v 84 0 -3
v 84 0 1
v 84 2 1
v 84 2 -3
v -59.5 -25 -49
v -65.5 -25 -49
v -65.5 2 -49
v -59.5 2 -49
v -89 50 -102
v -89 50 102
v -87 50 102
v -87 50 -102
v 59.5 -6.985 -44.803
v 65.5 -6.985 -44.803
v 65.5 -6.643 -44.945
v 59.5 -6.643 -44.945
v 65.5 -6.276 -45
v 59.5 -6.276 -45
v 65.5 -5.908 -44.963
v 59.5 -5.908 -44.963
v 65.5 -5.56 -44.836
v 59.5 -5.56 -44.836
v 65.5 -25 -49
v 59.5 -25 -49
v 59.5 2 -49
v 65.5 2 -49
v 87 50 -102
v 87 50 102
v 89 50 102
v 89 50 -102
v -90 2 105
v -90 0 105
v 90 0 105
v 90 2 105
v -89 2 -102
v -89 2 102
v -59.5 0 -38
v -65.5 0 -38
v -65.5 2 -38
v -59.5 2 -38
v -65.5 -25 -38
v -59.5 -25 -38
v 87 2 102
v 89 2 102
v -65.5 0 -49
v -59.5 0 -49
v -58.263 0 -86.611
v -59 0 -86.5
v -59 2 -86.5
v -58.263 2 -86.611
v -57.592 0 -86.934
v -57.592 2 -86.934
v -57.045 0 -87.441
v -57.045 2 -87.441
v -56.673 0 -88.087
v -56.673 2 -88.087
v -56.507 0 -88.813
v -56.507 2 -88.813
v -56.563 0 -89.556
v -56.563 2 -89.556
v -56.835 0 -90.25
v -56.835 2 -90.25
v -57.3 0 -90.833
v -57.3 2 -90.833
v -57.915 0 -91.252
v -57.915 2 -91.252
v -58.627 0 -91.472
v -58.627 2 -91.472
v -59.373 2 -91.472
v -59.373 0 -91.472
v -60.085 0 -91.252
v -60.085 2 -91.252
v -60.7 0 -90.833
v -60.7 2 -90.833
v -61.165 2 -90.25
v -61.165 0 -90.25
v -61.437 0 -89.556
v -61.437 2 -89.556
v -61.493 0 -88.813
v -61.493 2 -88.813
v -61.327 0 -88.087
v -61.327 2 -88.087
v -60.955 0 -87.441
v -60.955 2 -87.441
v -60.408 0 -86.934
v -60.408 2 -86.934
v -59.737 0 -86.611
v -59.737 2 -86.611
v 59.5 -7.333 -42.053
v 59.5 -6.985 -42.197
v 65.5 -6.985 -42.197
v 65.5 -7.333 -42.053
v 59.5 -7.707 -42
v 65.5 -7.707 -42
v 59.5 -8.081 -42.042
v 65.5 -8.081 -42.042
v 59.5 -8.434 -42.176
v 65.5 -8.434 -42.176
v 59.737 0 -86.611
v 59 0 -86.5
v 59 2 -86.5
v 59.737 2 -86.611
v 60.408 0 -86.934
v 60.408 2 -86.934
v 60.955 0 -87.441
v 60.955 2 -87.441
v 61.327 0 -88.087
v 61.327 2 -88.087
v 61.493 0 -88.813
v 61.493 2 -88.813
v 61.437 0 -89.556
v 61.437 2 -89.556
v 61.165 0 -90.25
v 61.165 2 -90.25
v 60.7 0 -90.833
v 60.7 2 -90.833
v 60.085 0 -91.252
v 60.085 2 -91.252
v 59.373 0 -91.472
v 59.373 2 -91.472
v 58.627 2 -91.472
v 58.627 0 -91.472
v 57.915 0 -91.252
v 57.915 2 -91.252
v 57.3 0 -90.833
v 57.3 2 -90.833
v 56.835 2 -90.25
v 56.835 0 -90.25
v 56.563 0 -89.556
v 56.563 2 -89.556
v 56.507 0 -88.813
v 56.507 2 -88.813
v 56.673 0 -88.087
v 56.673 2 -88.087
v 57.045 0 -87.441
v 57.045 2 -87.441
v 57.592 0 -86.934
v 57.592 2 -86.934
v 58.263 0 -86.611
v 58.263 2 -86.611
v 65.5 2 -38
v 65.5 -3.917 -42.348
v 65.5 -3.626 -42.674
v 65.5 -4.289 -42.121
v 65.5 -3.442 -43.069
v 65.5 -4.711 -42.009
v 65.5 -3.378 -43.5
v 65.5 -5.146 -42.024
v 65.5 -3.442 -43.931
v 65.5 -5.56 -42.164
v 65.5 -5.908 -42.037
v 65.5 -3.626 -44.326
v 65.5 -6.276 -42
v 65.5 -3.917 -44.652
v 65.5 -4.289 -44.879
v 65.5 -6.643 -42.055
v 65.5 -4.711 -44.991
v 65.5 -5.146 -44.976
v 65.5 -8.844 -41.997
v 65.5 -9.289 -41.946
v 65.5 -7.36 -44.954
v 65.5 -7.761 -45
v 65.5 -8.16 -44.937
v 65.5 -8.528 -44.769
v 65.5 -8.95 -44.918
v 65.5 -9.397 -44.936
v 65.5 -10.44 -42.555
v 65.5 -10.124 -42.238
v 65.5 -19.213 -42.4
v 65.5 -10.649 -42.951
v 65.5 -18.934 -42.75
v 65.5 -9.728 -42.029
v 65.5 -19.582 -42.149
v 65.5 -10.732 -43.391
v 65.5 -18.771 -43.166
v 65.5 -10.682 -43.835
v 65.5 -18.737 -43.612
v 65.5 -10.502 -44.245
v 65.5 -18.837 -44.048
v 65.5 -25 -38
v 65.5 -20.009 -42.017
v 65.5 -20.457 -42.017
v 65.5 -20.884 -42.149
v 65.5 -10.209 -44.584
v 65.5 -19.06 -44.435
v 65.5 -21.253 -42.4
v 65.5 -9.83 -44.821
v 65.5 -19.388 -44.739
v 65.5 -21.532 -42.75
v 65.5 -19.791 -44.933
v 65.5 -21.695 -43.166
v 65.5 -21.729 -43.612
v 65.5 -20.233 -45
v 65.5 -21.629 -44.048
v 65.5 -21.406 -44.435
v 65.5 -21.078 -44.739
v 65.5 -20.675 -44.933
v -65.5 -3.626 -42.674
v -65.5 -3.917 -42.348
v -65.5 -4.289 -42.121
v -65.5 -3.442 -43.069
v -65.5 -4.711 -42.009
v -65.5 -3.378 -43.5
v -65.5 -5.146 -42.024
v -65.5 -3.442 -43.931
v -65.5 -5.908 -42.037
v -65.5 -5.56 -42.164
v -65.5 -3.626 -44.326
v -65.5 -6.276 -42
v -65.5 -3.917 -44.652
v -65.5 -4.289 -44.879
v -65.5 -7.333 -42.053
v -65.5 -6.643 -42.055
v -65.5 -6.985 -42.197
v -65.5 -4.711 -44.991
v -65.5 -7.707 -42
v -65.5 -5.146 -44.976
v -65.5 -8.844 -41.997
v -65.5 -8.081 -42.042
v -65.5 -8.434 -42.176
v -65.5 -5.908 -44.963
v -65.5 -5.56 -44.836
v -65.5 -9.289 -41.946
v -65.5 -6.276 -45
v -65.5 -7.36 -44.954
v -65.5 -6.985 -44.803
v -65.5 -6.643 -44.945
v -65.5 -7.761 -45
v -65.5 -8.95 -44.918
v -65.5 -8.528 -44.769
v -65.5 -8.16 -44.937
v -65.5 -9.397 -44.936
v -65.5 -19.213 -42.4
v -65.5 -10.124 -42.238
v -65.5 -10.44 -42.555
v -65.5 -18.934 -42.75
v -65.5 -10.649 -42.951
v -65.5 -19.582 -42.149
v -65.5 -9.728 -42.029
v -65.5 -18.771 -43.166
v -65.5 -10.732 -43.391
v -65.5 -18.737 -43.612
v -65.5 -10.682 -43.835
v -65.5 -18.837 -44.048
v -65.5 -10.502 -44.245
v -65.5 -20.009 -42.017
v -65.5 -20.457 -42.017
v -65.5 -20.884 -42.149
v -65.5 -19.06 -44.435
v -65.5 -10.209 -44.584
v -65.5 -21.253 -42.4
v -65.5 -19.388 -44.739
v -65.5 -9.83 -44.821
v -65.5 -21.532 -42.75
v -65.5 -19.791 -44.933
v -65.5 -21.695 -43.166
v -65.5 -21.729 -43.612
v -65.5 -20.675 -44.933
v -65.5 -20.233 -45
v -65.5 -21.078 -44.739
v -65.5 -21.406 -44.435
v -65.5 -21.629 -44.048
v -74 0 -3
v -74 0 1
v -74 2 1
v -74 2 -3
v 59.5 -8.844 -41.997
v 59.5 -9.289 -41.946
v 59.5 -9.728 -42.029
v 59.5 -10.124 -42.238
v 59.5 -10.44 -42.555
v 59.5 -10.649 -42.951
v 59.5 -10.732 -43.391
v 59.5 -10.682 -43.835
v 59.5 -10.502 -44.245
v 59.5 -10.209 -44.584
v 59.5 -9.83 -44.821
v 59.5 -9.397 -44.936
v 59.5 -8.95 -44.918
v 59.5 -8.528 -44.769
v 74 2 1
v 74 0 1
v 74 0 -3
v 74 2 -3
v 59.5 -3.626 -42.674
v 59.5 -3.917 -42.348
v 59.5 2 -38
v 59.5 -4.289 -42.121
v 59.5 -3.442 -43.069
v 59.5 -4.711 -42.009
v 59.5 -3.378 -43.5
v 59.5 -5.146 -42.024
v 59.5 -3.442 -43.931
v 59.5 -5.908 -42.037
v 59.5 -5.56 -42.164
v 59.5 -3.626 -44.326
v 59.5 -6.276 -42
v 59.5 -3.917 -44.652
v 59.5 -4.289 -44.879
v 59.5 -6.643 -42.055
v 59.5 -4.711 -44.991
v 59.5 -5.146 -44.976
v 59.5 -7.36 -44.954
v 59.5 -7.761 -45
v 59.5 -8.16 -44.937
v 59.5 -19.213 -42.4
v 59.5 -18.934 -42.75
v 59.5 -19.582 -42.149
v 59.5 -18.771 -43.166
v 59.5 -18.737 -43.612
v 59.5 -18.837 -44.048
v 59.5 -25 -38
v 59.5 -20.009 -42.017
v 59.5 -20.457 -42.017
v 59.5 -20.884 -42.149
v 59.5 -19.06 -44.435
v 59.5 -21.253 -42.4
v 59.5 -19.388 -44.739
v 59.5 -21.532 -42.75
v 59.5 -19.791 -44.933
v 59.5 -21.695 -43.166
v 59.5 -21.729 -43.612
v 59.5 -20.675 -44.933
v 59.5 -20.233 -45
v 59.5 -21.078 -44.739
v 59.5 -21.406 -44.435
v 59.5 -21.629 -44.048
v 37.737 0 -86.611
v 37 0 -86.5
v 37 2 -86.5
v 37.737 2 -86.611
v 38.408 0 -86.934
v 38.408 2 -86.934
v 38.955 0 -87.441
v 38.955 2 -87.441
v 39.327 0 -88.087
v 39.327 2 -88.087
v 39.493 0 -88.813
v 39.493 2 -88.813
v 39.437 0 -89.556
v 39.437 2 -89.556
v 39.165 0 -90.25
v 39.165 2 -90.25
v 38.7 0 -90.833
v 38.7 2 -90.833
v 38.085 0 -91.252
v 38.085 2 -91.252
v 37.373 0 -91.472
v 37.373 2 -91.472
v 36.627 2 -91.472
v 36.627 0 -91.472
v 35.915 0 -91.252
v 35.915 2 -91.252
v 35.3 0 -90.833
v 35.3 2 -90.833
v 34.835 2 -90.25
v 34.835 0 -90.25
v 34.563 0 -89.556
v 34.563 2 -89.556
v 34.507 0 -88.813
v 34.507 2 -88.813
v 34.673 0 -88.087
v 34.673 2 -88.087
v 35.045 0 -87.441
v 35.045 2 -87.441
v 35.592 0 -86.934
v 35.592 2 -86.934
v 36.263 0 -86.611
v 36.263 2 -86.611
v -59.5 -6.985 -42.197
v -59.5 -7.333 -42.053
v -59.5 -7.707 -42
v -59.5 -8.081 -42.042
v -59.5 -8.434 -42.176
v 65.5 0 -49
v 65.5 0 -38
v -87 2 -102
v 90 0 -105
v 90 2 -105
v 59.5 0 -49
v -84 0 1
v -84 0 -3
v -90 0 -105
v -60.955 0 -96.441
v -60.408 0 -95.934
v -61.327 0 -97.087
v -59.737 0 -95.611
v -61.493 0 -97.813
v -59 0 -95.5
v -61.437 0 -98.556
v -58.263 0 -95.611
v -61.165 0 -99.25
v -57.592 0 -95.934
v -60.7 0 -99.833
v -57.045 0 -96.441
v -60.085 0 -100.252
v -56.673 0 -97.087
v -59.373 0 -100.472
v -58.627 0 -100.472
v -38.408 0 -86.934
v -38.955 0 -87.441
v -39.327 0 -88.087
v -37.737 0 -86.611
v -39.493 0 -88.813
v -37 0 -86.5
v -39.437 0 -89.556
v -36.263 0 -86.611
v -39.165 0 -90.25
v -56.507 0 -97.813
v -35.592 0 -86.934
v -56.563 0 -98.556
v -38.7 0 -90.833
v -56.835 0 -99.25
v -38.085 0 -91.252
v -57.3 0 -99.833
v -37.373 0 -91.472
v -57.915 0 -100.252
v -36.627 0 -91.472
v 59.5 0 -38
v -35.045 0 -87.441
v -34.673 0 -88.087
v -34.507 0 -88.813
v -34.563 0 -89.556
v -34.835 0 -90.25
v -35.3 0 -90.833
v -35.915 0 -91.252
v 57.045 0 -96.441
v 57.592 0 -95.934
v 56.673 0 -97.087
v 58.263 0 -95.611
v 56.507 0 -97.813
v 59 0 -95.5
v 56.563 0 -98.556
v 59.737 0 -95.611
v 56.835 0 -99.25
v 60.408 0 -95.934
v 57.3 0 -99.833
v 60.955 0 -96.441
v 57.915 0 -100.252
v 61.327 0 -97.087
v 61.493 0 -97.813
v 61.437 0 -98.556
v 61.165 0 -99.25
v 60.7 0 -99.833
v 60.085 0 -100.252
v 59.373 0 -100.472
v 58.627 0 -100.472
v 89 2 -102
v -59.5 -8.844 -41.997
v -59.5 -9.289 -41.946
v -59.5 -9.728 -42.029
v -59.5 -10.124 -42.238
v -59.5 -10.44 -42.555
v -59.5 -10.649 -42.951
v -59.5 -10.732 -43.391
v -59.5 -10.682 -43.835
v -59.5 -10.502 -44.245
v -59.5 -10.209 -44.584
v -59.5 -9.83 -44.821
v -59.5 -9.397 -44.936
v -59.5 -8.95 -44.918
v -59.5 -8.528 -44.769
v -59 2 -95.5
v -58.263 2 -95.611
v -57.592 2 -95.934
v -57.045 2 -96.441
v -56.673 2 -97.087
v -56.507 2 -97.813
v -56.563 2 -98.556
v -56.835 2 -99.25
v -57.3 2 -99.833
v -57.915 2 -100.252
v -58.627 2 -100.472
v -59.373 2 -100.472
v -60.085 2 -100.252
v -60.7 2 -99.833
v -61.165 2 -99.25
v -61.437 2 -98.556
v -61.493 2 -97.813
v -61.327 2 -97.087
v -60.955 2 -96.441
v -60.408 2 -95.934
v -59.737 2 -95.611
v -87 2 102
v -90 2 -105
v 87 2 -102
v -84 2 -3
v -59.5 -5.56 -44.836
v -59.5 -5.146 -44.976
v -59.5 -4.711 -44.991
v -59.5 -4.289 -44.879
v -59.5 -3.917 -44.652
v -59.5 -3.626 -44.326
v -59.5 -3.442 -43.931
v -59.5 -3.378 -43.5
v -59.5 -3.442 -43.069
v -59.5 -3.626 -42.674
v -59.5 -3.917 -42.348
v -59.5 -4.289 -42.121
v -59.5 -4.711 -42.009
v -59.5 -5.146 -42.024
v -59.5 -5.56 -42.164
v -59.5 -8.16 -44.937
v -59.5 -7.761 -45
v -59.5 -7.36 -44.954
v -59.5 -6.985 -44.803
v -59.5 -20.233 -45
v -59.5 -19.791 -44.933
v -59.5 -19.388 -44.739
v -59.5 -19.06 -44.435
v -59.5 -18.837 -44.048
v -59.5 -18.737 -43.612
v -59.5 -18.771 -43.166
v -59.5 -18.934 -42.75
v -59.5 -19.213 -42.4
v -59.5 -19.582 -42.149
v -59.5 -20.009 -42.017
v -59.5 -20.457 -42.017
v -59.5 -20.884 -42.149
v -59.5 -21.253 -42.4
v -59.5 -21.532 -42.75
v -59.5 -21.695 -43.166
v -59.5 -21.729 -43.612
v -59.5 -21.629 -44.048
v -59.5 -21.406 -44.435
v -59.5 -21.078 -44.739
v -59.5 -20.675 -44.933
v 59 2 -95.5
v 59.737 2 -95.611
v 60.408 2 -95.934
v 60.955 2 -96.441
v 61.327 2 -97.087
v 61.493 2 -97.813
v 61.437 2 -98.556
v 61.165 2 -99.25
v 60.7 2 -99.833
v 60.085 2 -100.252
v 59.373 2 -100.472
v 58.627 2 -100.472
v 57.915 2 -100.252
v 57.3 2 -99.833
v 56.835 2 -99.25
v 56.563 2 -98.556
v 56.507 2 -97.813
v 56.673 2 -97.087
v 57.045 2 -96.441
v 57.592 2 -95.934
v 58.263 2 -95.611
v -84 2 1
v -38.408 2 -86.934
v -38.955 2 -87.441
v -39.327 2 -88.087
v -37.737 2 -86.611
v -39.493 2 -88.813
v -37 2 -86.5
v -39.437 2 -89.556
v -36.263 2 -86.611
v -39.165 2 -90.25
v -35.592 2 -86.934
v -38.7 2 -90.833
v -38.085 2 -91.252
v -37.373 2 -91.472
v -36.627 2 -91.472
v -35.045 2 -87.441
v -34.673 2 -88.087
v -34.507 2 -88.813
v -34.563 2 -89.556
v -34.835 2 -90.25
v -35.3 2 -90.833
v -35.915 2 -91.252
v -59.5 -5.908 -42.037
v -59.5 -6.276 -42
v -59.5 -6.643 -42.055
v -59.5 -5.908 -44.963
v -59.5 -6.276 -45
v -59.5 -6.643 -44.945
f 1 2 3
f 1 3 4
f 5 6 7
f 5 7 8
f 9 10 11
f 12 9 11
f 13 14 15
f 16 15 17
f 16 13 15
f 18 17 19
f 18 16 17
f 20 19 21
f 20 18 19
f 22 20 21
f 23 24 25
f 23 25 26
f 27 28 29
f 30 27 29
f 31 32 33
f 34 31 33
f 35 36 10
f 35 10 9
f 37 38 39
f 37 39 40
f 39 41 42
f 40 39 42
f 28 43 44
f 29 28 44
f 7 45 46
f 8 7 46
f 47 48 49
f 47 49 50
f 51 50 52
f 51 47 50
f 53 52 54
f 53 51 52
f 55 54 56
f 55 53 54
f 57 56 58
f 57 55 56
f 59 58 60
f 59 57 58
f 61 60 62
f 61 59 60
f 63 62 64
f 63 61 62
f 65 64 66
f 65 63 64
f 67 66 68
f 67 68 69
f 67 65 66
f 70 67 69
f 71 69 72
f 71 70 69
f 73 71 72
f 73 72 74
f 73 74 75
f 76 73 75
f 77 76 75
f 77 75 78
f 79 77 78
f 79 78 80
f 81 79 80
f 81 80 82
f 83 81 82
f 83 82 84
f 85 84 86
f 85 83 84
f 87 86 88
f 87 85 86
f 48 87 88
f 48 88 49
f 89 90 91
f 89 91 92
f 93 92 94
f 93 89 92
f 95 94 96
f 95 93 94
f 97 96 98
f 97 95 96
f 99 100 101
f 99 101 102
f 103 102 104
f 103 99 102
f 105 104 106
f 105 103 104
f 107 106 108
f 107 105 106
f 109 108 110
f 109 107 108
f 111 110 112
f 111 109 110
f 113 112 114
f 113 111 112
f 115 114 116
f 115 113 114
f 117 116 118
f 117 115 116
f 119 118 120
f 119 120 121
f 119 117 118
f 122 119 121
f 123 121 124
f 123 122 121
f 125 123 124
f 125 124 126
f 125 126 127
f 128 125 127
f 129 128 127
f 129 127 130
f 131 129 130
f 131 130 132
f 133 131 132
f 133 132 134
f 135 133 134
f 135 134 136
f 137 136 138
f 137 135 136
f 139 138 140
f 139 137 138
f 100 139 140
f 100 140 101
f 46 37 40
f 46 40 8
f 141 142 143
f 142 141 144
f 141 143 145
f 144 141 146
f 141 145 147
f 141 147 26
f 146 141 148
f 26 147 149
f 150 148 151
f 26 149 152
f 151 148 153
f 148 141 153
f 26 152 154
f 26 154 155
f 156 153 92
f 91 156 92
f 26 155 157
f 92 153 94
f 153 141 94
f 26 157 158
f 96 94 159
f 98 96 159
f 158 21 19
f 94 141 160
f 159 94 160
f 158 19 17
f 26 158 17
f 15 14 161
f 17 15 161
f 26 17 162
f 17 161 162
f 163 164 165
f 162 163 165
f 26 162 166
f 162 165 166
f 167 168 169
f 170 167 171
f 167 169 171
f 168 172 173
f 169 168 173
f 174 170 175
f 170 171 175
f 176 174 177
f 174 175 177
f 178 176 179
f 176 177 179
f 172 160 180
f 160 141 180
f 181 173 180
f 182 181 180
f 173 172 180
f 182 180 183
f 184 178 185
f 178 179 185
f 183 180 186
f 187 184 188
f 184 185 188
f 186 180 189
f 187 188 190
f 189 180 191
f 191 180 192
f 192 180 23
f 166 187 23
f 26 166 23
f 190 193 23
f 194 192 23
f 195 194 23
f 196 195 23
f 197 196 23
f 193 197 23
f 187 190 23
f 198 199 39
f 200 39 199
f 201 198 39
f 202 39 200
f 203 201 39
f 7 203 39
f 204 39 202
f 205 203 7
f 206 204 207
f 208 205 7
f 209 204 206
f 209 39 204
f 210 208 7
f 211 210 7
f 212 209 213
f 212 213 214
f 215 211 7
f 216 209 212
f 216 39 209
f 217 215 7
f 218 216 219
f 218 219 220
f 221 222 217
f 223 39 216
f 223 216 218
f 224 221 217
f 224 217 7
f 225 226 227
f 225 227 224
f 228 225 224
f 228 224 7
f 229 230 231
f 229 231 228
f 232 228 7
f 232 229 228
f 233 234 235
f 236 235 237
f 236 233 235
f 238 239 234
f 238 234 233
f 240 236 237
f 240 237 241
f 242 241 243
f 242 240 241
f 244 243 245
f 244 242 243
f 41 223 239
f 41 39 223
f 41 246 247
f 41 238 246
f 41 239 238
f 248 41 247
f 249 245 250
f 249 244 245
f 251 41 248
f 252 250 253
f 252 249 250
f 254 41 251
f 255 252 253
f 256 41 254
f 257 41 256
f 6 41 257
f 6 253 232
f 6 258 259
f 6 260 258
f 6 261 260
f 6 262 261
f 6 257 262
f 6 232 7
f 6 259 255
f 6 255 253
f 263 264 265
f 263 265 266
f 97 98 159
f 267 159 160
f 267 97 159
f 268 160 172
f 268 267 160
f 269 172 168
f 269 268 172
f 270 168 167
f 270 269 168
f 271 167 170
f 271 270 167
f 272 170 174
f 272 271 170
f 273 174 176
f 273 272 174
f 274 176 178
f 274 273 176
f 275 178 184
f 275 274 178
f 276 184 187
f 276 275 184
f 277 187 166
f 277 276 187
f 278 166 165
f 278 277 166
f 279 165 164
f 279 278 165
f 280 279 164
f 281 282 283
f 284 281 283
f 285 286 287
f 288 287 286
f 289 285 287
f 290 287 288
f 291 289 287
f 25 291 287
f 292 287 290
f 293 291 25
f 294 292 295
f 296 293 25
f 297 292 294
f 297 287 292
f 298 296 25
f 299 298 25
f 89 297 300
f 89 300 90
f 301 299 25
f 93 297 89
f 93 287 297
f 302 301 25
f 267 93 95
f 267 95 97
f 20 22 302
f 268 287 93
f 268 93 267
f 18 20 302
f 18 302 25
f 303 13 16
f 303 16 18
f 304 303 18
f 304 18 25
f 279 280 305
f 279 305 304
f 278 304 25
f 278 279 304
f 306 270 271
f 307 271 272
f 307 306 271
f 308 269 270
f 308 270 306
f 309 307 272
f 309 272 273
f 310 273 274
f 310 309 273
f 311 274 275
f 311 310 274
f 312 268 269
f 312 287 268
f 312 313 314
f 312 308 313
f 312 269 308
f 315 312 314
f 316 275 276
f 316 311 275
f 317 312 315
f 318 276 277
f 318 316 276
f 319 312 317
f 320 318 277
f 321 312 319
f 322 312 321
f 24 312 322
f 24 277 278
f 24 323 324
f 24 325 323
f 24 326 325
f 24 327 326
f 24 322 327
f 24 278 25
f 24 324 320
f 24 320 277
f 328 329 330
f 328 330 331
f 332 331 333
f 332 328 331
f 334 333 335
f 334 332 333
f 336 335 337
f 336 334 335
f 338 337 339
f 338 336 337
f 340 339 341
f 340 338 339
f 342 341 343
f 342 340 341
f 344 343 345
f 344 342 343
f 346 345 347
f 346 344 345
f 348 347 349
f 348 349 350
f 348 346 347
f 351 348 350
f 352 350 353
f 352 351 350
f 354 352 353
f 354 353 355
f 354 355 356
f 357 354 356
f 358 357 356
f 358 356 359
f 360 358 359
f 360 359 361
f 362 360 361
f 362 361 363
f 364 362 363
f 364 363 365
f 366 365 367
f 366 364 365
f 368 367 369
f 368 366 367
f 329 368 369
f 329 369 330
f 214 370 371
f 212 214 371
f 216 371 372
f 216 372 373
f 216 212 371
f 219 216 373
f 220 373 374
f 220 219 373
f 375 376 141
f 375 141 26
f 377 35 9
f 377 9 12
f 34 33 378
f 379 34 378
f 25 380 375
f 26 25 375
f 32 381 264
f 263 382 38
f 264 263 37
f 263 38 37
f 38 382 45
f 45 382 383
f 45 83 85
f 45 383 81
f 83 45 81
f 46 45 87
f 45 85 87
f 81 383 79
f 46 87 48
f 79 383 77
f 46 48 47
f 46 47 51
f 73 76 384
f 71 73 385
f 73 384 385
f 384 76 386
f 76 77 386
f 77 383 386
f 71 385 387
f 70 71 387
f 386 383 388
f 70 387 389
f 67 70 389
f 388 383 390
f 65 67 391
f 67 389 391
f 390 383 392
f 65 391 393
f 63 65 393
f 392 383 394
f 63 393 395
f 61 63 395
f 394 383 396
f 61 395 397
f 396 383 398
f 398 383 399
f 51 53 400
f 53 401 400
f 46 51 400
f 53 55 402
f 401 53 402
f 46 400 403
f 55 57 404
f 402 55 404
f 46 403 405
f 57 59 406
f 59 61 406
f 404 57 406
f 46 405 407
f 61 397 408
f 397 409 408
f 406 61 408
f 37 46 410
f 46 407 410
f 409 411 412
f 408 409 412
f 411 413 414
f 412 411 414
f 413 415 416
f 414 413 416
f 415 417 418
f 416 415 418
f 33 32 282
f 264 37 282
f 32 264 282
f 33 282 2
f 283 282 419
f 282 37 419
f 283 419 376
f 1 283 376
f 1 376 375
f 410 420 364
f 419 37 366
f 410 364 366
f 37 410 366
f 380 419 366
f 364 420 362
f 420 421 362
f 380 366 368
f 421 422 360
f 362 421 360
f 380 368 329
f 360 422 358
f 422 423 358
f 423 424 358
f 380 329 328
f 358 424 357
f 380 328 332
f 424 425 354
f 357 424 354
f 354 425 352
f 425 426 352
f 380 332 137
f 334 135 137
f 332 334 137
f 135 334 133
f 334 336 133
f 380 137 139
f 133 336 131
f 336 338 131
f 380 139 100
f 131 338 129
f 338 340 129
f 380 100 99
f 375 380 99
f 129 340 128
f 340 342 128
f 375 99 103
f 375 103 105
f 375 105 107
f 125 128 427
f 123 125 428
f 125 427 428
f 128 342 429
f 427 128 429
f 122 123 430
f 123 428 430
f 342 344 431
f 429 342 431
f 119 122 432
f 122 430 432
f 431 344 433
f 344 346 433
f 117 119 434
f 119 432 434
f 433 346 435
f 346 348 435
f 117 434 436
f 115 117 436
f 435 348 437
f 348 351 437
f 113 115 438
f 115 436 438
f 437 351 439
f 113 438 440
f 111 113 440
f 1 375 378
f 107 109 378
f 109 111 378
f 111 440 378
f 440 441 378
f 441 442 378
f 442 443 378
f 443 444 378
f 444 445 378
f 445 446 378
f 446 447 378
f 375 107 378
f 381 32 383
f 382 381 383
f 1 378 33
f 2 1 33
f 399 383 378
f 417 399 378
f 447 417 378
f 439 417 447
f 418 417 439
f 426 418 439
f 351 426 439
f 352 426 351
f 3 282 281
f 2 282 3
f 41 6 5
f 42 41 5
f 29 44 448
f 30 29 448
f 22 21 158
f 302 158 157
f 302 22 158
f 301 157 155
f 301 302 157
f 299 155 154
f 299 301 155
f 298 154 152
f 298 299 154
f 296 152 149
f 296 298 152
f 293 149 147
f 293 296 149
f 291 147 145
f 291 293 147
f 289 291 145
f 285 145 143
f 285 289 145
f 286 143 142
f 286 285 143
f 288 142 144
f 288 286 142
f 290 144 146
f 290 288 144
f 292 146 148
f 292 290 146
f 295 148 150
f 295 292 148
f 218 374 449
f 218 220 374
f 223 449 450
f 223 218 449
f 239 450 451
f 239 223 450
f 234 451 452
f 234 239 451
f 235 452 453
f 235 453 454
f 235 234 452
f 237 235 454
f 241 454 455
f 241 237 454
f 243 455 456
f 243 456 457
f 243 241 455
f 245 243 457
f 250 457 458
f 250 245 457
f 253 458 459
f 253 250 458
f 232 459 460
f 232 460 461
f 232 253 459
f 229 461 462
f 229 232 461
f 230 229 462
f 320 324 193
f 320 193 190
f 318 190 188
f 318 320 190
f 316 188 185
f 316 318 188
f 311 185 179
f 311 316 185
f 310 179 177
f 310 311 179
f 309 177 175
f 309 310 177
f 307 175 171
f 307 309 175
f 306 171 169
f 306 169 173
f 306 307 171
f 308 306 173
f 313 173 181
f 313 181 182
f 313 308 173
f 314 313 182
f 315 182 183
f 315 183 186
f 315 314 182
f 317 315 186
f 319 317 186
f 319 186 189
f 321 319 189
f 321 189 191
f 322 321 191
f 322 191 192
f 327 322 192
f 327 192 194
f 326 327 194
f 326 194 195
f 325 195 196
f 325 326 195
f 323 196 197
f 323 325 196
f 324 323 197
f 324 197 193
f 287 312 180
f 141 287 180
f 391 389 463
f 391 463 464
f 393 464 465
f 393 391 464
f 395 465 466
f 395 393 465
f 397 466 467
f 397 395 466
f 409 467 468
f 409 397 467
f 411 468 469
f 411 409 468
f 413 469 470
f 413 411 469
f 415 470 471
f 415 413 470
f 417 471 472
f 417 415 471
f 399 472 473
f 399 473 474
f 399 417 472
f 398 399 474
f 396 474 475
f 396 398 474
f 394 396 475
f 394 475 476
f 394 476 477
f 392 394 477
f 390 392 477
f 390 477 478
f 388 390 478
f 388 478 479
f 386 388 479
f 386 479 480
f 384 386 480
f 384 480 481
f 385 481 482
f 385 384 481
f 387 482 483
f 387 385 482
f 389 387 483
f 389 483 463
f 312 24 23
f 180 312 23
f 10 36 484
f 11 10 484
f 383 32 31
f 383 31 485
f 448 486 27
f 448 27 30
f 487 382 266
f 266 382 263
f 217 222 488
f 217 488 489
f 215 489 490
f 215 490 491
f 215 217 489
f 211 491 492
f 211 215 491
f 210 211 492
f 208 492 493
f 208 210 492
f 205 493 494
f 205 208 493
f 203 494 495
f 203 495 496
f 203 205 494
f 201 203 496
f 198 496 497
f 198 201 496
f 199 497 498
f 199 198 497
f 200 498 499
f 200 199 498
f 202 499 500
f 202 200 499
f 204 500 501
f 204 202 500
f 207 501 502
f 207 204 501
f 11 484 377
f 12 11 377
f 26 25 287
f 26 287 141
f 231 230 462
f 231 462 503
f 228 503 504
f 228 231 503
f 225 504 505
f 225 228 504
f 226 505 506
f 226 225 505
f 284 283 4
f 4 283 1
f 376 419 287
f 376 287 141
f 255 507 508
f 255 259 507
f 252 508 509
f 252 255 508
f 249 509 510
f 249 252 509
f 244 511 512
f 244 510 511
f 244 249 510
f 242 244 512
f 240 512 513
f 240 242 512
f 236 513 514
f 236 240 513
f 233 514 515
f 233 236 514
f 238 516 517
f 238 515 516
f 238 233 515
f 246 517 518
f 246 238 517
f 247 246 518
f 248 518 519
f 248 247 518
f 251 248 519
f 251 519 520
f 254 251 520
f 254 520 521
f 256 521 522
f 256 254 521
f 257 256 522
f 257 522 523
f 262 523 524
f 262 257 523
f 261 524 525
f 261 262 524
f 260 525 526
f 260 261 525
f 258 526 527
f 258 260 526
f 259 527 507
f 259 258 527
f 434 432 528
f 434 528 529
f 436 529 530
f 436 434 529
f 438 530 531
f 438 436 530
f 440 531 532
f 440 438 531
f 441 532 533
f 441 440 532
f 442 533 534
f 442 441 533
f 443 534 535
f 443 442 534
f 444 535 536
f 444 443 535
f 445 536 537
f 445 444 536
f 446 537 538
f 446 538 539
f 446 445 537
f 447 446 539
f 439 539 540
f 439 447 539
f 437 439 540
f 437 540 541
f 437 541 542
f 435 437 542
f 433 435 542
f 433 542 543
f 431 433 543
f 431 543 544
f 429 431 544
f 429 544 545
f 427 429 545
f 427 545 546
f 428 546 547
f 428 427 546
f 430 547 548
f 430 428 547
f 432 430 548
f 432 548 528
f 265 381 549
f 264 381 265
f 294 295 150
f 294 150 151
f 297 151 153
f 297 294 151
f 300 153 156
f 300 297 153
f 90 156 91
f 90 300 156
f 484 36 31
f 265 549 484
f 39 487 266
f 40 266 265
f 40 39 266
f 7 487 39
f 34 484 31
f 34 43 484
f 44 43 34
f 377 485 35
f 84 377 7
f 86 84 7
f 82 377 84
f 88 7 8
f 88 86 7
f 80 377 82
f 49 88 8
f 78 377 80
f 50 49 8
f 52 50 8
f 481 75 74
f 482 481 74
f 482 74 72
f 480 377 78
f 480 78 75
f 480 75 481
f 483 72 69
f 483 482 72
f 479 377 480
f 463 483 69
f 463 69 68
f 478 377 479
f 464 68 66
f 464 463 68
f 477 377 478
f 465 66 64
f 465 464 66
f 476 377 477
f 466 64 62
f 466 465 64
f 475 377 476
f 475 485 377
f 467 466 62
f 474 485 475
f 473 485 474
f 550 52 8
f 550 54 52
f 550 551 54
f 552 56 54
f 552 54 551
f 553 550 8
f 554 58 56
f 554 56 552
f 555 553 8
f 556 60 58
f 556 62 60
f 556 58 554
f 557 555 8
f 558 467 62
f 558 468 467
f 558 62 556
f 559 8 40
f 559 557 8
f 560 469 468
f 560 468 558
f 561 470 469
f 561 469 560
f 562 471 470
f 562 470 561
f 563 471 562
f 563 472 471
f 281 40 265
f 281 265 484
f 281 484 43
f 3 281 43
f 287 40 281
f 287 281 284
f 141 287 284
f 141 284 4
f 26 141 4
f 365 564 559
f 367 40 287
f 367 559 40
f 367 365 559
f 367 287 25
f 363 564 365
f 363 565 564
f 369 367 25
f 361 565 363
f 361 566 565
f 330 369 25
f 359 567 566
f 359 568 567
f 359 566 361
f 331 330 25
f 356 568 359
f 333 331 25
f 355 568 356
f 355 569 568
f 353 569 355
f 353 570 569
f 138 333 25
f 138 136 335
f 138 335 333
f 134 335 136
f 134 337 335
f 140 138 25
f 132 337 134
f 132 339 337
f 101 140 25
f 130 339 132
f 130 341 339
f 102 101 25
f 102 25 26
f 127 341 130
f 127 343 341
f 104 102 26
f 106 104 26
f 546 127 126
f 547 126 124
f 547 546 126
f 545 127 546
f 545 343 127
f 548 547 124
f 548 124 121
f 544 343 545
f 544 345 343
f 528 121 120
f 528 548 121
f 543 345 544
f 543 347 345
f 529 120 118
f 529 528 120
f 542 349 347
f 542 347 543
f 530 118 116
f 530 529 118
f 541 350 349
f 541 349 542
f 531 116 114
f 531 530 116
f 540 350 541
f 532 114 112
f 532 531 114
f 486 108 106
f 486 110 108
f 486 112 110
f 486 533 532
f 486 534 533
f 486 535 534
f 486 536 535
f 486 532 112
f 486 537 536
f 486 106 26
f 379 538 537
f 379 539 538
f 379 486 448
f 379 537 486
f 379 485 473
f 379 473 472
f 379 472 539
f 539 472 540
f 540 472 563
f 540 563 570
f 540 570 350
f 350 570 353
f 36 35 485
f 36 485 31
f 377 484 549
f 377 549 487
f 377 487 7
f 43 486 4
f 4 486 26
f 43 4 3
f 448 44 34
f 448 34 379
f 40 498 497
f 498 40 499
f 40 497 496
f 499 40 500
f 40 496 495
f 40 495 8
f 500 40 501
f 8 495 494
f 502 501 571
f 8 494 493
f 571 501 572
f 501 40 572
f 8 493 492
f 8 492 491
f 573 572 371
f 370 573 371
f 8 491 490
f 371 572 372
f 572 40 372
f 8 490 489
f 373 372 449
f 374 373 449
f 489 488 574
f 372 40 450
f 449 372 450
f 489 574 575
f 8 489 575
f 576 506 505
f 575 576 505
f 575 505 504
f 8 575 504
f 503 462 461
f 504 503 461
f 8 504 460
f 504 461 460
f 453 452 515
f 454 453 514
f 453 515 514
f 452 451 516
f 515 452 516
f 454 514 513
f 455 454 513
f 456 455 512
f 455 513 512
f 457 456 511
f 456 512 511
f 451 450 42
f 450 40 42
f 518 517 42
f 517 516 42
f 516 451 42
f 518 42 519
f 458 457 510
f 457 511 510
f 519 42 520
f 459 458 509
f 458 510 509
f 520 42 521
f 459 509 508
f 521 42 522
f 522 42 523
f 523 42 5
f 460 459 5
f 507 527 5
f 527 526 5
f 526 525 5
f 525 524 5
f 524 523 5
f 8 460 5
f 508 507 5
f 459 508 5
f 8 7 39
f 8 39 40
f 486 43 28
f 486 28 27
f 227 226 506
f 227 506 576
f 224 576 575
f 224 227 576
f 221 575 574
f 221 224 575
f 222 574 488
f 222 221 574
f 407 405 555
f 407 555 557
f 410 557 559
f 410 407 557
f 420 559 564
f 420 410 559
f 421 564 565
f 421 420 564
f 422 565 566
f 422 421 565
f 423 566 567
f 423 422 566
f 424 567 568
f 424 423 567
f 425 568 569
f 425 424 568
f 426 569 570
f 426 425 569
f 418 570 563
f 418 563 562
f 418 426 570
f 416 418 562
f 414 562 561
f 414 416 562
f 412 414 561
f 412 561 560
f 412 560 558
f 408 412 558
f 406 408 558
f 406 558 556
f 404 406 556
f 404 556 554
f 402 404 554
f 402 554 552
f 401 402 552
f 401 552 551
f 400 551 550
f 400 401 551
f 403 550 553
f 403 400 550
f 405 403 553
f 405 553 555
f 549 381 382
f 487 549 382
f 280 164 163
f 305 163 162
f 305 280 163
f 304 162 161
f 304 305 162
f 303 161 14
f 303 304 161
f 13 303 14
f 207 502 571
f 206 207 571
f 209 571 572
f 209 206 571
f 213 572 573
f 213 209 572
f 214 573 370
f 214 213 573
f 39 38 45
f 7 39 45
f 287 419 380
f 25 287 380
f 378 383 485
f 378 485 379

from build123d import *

# Parameters (mm, degrees)
SKETCH1_W              = 180
SKETCH1_H              = 210
SKETCH1_R              = 2.5
SKETCH1_W_2            = 10
SKETCH1_H_2            = 4
SKETCH1_W_3            = 6
SKETCH1_H_3            = 11
SKETCH1_W_4            = 2
SKETCH1_H_4            = 204
MAINBODY_DEPTH         = 2
SAYAPRODA_DEPTH        = 2
SAYAPRODA_DEPTH_BACK   = 25
SKETCH1_4_W            = 6
SKETCH1_4_H            = 11
SAYAPRODA_2_DEPTH      = 2
SAYAPRODA_2_DEPTH_BACK = 25
SKETCH9_W              = 1.5
SKETCH9_H              = 155.5
HOLE1_AT_2_COUNT       = 2
HOLE1_AT_2_PITCH       = 11
HOLE1_AT_3_COUNT       = 2
HOLE1_AT_3_PITCH       = 12.504350098
HOLE1_AT_4_COUNT       = 2
HOLE1_AT_4_PITCH       = 13.992231398
HOLE1_AT_5_COUNT       = 2
HOLE1_AT_5_PITCH       = 15.354775431
SKETCH1_5_W            = 2
SKETCH1_5_H            = 204
BOSS_EXTRUDE4_DEPTH    = 50


with BuildPart() as part:
    # Sketch1 → MainBody (new body)
    with BuildSketch(Plane(origin=(0, 0, 0), x_dir=(1, 0, 0), z_dir=(0, 1, 0))):
        Rectangle(SKETCH1_W, SKETCH1_H)
        with Locations((-59, 98)):
            Circle(SKETCH1_R, mode=Mode.SUBTRACT)
        with Locations((-59, 89)):
            Circle(SKETCH1_R, mode=Mode.SUBTRACT)
        with Locations((-37, 89)):
            Circle(SKETCH1_R, mode=Mode.SUBTRACT)
        with Locations((59, 98)):
            Circle(SKETCH1_R, mode=Mode.SUBTRACT)
        with Locations((59, 89)):
            Circle(SKETCH1_R, mode=Mode.SUBTRACT)
        with Locations((37, 89)):
            Circle(SKETCH1_R, mode=Mode.SUBTRACT)
        with Locations((79, 1)):
            Rectangle(SKETCH1_W_2, SKETCH1_H_2, mode=Mode.SUBTRACT)
        with Locations((-79, 1)):
            Rectangle(SKETCH1_W_2, SKETCH1_H_2, mode=Mode.SUBTRACT)
        with Locations((-62.5, 43.5)):
            Rectangle(SKETCH1_W_3, SKETCH1_H_3, mode=Mode.SUBTRACT)
        with Locations((62.5, 43.5)):
            Rectangle(SKETCH1_W_3, SKETCH1_H_3, mode=Mode.SUBTRACT)
        with Locations((-88, 0)):
            Rectangle(SKETCH1_W_4, SKETCH1_H_4, mode=Mode.SUBTRACT)
        with Locations((88, 0)):
            Rectangle(SKETCH1_W_4, SKETCH1_H_4, mode=Mode.SUBTRACT)
    extrude(amount=MAINBODY_DEPTH)

    # Sketch1<5> → Boss-Extrude4 (add)
    with BuildSketch(Plane(origin=(0, 0, 0), x_dir=(1, 0, 0), z_dir=(0, 1, 0))):
        with Locations((-88, 0)):
            Rectangle(SKETCH1_5_W, SKETCH1_5_H)
        with Locations((88, 0)):
            Rectangle(SKETCH1_5_W, SKETCH1_5_H)
    extrude(amount=BOSS_EXTRUDE4_DEPTH)


with BuildPart() as body_2:
    # Sketch1<4> → SayapRoda (new, two sides: drawn at the far end of the back side and taken through both)
    with BuildSketch(Plane(origin=(0, 0, 0), x_dir=(1, 0, 0), z_dir=(0, 1, 0)).offset(-SAYAPRODA_DEPTH_BACK)):
        with Locations((-62.5, 43.5)):
            Rectangle(SKETCH1_4_W, SKETCH1_4_H)
    extrude(amount=SAYAPRODA_DEPTH + SAYAPRODA_DEPTH_BACK)


with BuildPart() as body_3:
    # Sketch1<4> → SayapRoda 2 (new, two sides: drawn at the far end of the back side and taken through both)
    with BuildSketch(Plane(origin=(0, 0, 0), x_dir=(1, 0, 0), z_dir=(0, 1, 0)).offset(-SAYAPRODA_2_DEPTH_BACK)):
        with Locations((62.5, 43.5)):
            Rectangle(SKETCH1_4_W, SKETCH1_4_H)
    extrude(amount=SAYAPRODA_2_DEPTH + SAYAPRODA_2_DEPTH_BACK)


with BuildPart() as hole1_tool:
    # Sketch9 → Hole1 (revolve)
    with BuildSketch(Plane(origin=(65.5, -20.233052412, -43.5), x_dir=(0, 0, -1), z_dir=(0, 1, 0))):
        with Locations((0.75, 77.75)):
            Rectangle(SKETCH9_W, SKETCH9_H)
    hole1 = revolve(axis=Axis((-44.5, -20.233052412, -43.5), (1, 0, 0)))


with BuildPart() as body_2_1:
    add(body_2.part)

    # Hole1: cut by hole1_tool
    add(hole1_tool.part, mode=Mode.SUBTRACT)


with BuildPart() as body_3_1:
    add(body_3.part)

    # Hole1: cut by hole1_tool
    add(hole1_tool.part, mode=Mode.SUBTRACT)


with BuildPart() as hole1_at_2_tool:
    # Hole1 at 2: Hole1 ×2
    with Locations(*[Vector(0, 0.9999876242984519, 0.004975062807454704) * (i * HOLE1_AT_2_PITCH) for i in range(1, HOLE1_AT_2_COUNT)]):
        add(hole1)


with BuildPart() as body_2_2:
    add(body_2_1.part)

    # Hole1 at 2: cut by hole1_at_2_tool
    add(hole1_at_2_tool.part, mode=Mode.SUBTRACT)


with BuildPart() as body_3_2:
    add(body_3_1.part)

    # Hole1 at 2: cut by hole1_at_2_tool
    add(hole1_at_2_tool.part, mode=Mode.SUBTRACT)


with BuildPart() as hole1_at_3_tool:
    # Hole1 at 3: Hole1 ×2
    with Locations(*[(0, i * HOLE1_AT_3_PITCH, 0) for i in range(1, HOLE1_AT_3_COUNT)]):
        add(hole1)


with BuildPart() as body_2_3:
    add(body_2_2.part)

    # Hole1 at 3: cut by hole1_at_3_tool
    add(hole1_at_3_tool.part, mode=Mode.SUBTRACT)


with BuildPart() as body_3_3:
    add(body_3_2.part)

    # Hole1 at 3: cut by hole1_at_3_tool
    add(hole1_at_3_tool.part, mode=Mode.SUBTRACT)


with BuildPart() as hole1_at_4_tool:
    # Hole1 at 4: Hole1 ×2
    with Locations(*[(0, i * HOLE1_AT_4_PITCH, 0) for i in range(1, HOLE1_AT_4_COUNT)]):
        add(hole1)


with BuildPart() as body_2_4:
    add(body_2_3.part)

    # Hole1 at 4: cut by hole1_at_4_tool
    add(hole1_at_4_tool.part, mode=Mode.SUBTRACT)


with BuildPart() as body_3_4:
    add(body_3_3.part)

    # Hole1 at 4: cut by hole1_at_4_tool
    add(hole1_at_4_tool.part, mode=Mode.SUBTRACT)


with BuildPart() as hole1_at_5_tool:
    # Hole1 at 5: Hole1 ×2
    with Locations(*[(0, i * HOLE1_AT_5_PITCH, 0) for i in range(1, HOLE1_AT_5_COUNT)]):
        add(hole1)


with BuildPart() as body_2_5:
    add(body_2_4.part)

    # Hole1 at 5: cut by hole1_at_5_tool
    add(hole1_at_5_tool.part, mode=Mode.SUBTRACT)


with BuildPart() as body_3_5:
    add(body_3_4.part)

    # Hole1 at 5: cut by hole1_at_5_tool
    add(hole1_at_5_tool.part, mode=Mode.SUBTRACT)


solid = Compound([part.part, body_2_5.part, body_3_5.part])
